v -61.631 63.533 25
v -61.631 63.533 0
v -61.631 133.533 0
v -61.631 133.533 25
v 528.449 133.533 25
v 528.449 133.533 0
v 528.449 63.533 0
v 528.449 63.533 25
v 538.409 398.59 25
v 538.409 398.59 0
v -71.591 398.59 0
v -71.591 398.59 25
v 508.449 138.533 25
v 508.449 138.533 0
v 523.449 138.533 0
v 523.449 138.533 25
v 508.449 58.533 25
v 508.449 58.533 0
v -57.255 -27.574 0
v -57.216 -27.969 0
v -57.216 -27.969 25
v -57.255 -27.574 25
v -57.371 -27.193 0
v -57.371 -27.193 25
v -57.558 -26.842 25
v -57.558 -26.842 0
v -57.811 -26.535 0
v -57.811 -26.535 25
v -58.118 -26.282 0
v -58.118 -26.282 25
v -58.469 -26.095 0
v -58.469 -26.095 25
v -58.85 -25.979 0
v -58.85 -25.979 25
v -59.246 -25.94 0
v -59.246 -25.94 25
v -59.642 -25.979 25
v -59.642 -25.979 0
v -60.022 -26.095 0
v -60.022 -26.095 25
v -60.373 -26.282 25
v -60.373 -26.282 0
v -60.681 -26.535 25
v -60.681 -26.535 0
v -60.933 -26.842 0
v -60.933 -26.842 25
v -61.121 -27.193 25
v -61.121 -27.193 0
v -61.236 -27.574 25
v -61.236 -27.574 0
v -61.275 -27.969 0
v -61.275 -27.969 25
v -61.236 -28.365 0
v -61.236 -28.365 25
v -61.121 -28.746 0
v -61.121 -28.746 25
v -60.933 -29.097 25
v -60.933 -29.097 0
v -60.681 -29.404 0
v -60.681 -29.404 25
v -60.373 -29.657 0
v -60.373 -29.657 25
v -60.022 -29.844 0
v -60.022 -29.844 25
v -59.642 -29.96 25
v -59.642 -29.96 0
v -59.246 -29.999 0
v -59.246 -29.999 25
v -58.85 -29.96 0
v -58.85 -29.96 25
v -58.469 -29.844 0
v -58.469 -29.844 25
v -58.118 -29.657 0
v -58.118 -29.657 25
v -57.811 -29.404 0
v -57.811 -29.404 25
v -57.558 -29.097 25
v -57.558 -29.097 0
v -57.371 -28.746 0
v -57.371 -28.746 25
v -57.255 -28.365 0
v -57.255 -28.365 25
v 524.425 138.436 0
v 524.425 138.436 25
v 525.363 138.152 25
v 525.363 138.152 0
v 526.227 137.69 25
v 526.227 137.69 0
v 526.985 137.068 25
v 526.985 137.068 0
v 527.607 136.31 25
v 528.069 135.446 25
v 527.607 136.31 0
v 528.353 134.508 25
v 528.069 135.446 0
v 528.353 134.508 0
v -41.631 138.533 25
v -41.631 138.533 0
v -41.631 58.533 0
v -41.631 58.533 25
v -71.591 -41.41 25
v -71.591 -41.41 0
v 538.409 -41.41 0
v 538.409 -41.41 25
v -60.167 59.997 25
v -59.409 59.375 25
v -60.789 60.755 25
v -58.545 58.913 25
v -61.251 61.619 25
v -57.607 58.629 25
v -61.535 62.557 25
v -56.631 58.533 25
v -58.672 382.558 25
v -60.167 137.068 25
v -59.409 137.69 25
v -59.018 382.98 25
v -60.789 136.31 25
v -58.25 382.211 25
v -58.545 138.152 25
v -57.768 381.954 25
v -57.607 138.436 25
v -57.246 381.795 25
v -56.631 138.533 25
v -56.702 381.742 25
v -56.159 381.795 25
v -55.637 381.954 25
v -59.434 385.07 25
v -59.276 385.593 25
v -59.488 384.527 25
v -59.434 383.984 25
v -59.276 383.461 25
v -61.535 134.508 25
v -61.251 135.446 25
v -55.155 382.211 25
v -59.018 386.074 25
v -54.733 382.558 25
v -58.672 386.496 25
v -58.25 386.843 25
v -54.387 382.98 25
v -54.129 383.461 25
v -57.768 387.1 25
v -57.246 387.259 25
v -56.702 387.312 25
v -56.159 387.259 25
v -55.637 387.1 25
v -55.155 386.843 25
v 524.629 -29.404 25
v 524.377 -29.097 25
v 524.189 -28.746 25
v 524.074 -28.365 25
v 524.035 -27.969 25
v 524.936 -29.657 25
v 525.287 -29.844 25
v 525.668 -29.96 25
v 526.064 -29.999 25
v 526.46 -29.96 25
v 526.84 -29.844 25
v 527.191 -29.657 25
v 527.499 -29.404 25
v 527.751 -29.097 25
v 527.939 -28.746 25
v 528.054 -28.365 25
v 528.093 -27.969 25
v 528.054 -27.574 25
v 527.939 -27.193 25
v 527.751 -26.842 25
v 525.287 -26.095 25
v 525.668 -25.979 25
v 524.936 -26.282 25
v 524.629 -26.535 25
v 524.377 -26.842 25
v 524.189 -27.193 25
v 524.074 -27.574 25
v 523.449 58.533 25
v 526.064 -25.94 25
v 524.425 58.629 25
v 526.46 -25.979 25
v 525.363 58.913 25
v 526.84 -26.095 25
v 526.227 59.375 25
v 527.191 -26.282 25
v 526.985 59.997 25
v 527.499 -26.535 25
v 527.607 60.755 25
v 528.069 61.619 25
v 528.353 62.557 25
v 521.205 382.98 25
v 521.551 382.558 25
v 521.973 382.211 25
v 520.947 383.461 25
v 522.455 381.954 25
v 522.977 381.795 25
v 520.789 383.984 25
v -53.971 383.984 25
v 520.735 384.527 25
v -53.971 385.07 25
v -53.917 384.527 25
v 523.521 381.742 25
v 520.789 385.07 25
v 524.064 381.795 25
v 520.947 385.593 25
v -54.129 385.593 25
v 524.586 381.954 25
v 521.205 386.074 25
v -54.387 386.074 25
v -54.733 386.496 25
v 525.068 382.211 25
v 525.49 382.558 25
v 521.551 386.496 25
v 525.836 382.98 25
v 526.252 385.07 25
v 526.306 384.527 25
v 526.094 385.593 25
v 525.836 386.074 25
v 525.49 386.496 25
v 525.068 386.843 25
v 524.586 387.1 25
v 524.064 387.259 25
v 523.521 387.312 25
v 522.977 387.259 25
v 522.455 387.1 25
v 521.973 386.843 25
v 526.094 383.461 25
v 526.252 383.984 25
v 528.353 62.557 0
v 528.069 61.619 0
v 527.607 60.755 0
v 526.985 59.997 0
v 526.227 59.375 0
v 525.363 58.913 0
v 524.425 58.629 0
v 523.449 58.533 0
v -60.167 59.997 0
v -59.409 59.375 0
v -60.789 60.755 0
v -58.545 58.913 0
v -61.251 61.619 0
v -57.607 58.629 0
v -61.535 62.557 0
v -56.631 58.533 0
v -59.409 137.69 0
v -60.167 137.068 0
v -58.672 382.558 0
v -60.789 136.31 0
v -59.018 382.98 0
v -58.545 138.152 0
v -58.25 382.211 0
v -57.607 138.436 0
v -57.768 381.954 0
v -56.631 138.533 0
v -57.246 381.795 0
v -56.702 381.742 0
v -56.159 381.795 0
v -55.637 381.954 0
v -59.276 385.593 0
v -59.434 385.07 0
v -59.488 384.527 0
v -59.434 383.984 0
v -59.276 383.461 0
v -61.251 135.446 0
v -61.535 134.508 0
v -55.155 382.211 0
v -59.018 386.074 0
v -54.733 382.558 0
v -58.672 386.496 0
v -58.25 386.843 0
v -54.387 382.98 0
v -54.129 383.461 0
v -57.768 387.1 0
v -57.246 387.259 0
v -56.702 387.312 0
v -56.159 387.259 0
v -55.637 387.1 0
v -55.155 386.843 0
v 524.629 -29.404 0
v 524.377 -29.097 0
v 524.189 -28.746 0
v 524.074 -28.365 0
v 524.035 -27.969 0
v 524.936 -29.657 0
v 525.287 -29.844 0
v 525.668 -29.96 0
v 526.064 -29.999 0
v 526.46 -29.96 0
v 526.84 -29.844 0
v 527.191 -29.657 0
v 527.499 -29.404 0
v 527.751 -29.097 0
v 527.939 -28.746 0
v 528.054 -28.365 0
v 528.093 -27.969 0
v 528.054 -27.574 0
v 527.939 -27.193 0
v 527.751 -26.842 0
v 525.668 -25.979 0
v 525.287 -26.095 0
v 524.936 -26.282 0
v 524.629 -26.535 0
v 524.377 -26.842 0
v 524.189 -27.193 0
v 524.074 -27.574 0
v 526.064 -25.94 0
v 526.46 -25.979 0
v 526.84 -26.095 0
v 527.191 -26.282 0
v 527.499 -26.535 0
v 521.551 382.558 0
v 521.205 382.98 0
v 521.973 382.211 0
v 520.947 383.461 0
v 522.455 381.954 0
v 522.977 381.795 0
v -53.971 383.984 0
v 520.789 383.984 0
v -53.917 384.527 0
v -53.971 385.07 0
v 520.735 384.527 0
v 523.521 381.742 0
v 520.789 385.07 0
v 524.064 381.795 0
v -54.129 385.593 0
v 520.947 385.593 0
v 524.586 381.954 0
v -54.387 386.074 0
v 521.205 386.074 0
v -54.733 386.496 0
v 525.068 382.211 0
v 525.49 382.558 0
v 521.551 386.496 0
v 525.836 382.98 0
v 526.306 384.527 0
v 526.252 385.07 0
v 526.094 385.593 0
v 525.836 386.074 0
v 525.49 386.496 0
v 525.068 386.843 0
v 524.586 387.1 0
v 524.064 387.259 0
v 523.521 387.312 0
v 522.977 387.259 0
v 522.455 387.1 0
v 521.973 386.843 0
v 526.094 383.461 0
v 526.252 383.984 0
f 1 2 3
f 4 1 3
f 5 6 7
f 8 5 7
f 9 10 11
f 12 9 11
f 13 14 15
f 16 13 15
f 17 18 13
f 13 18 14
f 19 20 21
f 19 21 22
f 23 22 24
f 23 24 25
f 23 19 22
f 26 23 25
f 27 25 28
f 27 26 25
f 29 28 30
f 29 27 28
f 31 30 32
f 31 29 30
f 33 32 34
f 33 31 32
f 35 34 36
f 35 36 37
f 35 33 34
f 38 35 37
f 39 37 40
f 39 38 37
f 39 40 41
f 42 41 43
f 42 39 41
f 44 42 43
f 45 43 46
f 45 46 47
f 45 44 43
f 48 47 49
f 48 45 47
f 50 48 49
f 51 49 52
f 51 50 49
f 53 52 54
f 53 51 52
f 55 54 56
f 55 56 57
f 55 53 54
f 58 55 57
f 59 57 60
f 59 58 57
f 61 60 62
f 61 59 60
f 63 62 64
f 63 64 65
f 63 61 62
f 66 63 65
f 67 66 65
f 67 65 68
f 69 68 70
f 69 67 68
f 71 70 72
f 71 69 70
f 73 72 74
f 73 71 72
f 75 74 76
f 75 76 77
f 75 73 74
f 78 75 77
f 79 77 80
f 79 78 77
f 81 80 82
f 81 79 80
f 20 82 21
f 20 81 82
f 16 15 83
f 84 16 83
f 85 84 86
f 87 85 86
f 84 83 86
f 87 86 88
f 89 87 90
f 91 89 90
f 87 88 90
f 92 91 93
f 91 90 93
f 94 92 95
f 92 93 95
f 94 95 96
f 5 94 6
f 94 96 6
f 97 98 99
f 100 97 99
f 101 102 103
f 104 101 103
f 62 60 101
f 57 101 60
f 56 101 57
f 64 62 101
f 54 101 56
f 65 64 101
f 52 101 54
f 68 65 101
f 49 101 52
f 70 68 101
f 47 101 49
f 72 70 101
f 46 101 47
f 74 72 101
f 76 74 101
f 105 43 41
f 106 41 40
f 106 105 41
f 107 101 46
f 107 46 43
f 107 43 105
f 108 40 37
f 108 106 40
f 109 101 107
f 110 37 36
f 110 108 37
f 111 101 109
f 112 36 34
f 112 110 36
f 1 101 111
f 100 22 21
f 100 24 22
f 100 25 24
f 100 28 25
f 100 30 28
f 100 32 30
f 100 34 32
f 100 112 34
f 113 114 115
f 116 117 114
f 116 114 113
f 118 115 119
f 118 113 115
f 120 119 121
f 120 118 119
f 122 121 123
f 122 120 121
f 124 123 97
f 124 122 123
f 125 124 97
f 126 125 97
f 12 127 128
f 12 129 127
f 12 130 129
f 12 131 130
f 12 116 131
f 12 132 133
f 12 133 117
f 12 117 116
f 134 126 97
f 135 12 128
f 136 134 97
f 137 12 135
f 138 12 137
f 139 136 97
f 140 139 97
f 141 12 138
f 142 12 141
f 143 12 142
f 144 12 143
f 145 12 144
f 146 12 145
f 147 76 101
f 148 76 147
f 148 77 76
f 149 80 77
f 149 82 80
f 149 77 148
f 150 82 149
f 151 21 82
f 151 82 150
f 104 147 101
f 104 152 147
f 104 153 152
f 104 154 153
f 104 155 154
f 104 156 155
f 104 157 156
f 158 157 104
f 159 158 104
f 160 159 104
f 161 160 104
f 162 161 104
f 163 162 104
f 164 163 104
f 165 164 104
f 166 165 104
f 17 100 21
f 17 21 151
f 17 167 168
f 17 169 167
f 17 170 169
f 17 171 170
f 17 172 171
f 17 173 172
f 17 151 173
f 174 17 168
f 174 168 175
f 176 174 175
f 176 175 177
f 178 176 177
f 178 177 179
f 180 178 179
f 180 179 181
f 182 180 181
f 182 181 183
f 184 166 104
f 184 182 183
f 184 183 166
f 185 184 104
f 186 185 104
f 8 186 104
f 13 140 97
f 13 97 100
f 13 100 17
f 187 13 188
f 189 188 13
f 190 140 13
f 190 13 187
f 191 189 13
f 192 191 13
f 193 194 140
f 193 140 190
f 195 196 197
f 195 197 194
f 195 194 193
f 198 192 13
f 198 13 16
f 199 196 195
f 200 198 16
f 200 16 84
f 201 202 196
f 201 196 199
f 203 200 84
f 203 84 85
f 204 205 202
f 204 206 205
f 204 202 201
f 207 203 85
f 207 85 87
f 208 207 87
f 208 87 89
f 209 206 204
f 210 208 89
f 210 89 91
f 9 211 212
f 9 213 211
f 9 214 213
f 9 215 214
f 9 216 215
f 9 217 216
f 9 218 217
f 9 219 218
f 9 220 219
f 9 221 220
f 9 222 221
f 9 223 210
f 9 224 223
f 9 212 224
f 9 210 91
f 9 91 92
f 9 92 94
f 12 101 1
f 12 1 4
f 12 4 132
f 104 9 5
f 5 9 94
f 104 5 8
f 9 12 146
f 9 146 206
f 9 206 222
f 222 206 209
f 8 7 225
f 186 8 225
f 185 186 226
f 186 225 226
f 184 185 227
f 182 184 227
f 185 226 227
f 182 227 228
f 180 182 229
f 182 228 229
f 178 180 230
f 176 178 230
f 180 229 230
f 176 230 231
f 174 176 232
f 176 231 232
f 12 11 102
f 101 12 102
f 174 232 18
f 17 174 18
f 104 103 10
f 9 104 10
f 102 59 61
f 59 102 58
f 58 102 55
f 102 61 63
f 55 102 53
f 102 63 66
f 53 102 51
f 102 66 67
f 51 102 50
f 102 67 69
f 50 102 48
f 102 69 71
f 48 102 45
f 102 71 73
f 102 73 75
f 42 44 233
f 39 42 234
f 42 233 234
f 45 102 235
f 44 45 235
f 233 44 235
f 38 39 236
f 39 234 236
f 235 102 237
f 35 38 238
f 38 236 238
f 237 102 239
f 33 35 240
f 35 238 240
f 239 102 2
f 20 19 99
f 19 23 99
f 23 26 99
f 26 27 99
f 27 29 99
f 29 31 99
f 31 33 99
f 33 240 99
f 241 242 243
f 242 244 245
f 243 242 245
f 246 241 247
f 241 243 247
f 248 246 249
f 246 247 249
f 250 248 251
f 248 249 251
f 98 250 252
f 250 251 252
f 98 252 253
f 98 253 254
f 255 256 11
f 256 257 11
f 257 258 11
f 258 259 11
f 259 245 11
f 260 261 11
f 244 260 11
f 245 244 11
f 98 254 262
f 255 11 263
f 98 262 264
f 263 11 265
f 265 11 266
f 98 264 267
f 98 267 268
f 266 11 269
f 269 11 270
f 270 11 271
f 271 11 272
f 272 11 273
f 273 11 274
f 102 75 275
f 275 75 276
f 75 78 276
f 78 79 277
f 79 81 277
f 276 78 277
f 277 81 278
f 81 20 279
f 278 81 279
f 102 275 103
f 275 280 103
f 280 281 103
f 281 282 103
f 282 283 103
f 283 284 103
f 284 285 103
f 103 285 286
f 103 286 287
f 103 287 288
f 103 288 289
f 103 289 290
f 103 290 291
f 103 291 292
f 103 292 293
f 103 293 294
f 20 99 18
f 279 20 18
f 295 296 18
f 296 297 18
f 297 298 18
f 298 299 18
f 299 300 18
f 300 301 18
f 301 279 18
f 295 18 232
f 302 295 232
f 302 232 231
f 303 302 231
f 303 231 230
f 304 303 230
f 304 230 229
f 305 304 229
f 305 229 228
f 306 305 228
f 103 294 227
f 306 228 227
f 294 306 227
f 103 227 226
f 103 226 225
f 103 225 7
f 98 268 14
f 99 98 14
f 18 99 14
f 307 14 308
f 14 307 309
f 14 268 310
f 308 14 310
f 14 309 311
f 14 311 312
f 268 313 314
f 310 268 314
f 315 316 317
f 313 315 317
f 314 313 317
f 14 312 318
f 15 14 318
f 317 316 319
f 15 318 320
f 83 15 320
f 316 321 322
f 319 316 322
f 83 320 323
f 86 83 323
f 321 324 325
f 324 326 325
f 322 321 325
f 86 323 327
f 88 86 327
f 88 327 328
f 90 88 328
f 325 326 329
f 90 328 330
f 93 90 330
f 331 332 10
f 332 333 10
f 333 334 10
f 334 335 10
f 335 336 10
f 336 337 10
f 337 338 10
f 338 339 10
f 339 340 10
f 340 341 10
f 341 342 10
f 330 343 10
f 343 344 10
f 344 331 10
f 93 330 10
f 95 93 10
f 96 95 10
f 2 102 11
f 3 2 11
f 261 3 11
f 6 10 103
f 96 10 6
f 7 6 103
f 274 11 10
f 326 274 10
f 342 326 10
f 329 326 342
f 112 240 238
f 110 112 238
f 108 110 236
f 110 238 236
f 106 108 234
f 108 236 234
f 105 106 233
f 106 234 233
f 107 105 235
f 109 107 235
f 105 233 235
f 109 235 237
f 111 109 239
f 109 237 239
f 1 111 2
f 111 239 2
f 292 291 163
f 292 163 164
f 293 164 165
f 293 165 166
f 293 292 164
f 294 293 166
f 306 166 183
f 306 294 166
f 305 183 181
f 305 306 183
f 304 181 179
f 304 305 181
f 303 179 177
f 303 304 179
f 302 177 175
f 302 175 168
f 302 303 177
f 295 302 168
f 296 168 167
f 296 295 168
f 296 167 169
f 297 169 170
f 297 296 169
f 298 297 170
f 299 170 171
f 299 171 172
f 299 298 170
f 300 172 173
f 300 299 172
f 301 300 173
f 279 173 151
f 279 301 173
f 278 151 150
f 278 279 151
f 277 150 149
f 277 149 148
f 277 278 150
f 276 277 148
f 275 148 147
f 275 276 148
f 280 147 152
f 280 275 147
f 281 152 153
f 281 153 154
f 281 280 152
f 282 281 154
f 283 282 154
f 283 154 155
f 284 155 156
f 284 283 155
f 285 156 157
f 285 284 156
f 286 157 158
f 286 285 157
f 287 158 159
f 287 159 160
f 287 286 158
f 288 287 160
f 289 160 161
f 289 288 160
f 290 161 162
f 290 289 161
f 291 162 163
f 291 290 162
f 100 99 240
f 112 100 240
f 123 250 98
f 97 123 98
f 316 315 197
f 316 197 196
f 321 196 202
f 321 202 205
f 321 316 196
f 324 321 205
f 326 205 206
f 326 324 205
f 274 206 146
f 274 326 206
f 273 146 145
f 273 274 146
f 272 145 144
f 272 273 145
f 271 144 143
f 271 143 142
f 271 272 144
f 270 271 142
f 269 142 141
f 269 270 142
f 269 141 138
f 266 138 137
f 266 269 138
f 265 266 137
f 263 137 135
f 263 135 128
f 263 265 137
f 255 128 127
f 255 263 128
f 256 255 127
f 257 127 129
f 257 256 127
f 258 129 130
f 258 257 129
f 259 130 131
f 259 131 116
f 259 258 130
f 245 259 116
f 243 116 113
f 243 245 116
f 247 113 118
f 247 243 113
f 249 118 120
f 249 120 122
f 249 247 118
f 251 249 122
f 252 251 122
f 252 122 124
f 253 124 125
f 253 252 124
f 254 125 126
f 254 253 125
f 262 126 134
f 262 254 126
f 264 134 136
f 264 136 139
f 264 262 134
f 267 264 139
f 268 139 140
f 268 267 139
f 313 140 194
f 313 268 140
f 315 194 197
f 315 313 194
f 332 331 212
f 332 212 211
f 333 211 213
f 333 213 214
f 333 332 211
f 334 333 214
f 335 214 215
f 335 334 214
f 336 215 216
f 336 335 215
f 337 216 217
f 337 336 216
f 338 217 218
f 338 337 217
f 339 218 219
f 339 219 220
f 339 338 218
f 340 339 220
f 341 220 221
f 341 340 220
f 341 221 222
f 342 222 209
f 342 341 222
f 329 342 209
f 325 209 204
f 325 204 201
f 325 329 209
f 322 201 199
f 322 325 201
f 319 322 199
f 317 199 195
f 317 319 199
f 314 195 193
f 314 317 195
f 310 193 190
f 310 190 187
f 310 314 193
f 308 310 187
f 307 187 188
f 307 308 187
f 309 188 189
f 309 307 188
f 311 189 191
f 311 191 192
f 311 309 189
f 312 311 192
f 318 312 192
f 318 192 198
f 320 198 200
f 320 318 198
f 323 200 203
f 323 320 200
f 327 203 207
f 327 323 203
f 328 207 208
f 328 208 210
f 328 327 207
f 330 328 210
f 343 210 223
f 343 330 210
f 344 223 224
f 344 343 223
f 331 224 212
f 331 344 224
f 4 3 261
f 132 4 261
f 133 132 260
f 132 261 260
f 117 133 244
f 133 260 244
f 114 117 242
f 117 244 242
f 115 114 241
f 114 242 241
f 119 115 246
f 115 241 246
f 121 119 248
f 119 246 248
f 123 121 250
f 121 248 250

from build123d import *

# Parameters (mm, degrees)
F0_R     = 2.0293084654
F0_R_2   = 2.7851350605
F1_DEPTH = 25


with BuildPart() as f1:
    # F0 (on Top) → F1 (new body)
    with BuildSketch(Plane.XY):
        Polygon((-38.5909078717, 398.5895687342), (-71.5909078717, 398.5895687342), (-71.5909078717, -41.4104312658), (-38.5909078717, -41.4104312658), (-38.5909078717, 191.306501627), align=None)
        with Locations((-59.2456907034, -27.969462797)):
            Circle(F0_R, mode=Mode.SUBTRACT)
        with BuildLine():
            ThreePointArc((-56.6312761605, 58.5325606167), (-60.1668100664, 59.9970267108), (-61.6312761605, 63.5325606167))
            Line((-61.6312761605, 63.5325606167), (-61.6312761605, 133.5325606167))
            ThreePointArc((-61.6312761605, 133.5325606167), (-60.1668100664, 137.0680945227), (-56.6312761605, 138.5325606167))
            Line((-56.6312761605, 138.5325606167), (-41.6312761605, 138.5325606167))
            Line((-41.6312761605, 138.5325606167), (-41.6312761605, 58.5325606167))
            Line((-41.6312761605, 58.5325606167), (-56.6312761605, 58.5325606167))
        make_face(mode=Mode.SUBTRACT)
        with Locations((-56.7024089396, 384.5269083977)):
            Circle(F0_R_2, mode=Mode.SUBTRACT)
        Polygon((505.4090921283, 398.5895687342), (-38.5909078717, 398.5895687342), (-38.5909078717, 191.306501627), (-38.5909078717, -41.4104312658), (505.4090921283, -41.4104312658), (505.4090921283, 191.306501627), align=None)
        Polygon((538.4090921283, 398.5895687342), (505.4090921283, 398.5895687342), (505.4090921283, 191.306501627), (505.4090921283, -41.4104312658), (538.4090921283, -41.4104312658), align=None)
        with Locations((526.0638749599, -27.969462797)):
            Circle(F0_R, mode=Mode.SUBTRACT)
        with BuildLine():
            Line((508.449460417, 138.5325606167), (523.449460417, 138.5325606167))
            ThreePointArc((523.449460417, 138.5325606167), (526.984994323, 137.0680945227), (528.449460417, 133.5325606167))
            Line((528.449460417, 133.5325606167), (528.449460417, 63.5325606167))
            ThreePointArc((528.449460417, 63.5325606167), (526.984994323, 59.9970267108), (523.449460417, 58.5325606167))
            Line((523.449460417, 58.5325606167), (508.449460417, 58.5325606167))
            Line((508.449460417, 58.5325606167), (508.449460417, 138.5325606167))
        make_face(mode=Mode.SUBTRACT)
        with Locations((523.5205931962, 384.5269083977)):
            Circle(F0_R_2, mode=Mode.SUBTRACT)
    extrude(amount=F1_DEPTH)


solid = f1.part
